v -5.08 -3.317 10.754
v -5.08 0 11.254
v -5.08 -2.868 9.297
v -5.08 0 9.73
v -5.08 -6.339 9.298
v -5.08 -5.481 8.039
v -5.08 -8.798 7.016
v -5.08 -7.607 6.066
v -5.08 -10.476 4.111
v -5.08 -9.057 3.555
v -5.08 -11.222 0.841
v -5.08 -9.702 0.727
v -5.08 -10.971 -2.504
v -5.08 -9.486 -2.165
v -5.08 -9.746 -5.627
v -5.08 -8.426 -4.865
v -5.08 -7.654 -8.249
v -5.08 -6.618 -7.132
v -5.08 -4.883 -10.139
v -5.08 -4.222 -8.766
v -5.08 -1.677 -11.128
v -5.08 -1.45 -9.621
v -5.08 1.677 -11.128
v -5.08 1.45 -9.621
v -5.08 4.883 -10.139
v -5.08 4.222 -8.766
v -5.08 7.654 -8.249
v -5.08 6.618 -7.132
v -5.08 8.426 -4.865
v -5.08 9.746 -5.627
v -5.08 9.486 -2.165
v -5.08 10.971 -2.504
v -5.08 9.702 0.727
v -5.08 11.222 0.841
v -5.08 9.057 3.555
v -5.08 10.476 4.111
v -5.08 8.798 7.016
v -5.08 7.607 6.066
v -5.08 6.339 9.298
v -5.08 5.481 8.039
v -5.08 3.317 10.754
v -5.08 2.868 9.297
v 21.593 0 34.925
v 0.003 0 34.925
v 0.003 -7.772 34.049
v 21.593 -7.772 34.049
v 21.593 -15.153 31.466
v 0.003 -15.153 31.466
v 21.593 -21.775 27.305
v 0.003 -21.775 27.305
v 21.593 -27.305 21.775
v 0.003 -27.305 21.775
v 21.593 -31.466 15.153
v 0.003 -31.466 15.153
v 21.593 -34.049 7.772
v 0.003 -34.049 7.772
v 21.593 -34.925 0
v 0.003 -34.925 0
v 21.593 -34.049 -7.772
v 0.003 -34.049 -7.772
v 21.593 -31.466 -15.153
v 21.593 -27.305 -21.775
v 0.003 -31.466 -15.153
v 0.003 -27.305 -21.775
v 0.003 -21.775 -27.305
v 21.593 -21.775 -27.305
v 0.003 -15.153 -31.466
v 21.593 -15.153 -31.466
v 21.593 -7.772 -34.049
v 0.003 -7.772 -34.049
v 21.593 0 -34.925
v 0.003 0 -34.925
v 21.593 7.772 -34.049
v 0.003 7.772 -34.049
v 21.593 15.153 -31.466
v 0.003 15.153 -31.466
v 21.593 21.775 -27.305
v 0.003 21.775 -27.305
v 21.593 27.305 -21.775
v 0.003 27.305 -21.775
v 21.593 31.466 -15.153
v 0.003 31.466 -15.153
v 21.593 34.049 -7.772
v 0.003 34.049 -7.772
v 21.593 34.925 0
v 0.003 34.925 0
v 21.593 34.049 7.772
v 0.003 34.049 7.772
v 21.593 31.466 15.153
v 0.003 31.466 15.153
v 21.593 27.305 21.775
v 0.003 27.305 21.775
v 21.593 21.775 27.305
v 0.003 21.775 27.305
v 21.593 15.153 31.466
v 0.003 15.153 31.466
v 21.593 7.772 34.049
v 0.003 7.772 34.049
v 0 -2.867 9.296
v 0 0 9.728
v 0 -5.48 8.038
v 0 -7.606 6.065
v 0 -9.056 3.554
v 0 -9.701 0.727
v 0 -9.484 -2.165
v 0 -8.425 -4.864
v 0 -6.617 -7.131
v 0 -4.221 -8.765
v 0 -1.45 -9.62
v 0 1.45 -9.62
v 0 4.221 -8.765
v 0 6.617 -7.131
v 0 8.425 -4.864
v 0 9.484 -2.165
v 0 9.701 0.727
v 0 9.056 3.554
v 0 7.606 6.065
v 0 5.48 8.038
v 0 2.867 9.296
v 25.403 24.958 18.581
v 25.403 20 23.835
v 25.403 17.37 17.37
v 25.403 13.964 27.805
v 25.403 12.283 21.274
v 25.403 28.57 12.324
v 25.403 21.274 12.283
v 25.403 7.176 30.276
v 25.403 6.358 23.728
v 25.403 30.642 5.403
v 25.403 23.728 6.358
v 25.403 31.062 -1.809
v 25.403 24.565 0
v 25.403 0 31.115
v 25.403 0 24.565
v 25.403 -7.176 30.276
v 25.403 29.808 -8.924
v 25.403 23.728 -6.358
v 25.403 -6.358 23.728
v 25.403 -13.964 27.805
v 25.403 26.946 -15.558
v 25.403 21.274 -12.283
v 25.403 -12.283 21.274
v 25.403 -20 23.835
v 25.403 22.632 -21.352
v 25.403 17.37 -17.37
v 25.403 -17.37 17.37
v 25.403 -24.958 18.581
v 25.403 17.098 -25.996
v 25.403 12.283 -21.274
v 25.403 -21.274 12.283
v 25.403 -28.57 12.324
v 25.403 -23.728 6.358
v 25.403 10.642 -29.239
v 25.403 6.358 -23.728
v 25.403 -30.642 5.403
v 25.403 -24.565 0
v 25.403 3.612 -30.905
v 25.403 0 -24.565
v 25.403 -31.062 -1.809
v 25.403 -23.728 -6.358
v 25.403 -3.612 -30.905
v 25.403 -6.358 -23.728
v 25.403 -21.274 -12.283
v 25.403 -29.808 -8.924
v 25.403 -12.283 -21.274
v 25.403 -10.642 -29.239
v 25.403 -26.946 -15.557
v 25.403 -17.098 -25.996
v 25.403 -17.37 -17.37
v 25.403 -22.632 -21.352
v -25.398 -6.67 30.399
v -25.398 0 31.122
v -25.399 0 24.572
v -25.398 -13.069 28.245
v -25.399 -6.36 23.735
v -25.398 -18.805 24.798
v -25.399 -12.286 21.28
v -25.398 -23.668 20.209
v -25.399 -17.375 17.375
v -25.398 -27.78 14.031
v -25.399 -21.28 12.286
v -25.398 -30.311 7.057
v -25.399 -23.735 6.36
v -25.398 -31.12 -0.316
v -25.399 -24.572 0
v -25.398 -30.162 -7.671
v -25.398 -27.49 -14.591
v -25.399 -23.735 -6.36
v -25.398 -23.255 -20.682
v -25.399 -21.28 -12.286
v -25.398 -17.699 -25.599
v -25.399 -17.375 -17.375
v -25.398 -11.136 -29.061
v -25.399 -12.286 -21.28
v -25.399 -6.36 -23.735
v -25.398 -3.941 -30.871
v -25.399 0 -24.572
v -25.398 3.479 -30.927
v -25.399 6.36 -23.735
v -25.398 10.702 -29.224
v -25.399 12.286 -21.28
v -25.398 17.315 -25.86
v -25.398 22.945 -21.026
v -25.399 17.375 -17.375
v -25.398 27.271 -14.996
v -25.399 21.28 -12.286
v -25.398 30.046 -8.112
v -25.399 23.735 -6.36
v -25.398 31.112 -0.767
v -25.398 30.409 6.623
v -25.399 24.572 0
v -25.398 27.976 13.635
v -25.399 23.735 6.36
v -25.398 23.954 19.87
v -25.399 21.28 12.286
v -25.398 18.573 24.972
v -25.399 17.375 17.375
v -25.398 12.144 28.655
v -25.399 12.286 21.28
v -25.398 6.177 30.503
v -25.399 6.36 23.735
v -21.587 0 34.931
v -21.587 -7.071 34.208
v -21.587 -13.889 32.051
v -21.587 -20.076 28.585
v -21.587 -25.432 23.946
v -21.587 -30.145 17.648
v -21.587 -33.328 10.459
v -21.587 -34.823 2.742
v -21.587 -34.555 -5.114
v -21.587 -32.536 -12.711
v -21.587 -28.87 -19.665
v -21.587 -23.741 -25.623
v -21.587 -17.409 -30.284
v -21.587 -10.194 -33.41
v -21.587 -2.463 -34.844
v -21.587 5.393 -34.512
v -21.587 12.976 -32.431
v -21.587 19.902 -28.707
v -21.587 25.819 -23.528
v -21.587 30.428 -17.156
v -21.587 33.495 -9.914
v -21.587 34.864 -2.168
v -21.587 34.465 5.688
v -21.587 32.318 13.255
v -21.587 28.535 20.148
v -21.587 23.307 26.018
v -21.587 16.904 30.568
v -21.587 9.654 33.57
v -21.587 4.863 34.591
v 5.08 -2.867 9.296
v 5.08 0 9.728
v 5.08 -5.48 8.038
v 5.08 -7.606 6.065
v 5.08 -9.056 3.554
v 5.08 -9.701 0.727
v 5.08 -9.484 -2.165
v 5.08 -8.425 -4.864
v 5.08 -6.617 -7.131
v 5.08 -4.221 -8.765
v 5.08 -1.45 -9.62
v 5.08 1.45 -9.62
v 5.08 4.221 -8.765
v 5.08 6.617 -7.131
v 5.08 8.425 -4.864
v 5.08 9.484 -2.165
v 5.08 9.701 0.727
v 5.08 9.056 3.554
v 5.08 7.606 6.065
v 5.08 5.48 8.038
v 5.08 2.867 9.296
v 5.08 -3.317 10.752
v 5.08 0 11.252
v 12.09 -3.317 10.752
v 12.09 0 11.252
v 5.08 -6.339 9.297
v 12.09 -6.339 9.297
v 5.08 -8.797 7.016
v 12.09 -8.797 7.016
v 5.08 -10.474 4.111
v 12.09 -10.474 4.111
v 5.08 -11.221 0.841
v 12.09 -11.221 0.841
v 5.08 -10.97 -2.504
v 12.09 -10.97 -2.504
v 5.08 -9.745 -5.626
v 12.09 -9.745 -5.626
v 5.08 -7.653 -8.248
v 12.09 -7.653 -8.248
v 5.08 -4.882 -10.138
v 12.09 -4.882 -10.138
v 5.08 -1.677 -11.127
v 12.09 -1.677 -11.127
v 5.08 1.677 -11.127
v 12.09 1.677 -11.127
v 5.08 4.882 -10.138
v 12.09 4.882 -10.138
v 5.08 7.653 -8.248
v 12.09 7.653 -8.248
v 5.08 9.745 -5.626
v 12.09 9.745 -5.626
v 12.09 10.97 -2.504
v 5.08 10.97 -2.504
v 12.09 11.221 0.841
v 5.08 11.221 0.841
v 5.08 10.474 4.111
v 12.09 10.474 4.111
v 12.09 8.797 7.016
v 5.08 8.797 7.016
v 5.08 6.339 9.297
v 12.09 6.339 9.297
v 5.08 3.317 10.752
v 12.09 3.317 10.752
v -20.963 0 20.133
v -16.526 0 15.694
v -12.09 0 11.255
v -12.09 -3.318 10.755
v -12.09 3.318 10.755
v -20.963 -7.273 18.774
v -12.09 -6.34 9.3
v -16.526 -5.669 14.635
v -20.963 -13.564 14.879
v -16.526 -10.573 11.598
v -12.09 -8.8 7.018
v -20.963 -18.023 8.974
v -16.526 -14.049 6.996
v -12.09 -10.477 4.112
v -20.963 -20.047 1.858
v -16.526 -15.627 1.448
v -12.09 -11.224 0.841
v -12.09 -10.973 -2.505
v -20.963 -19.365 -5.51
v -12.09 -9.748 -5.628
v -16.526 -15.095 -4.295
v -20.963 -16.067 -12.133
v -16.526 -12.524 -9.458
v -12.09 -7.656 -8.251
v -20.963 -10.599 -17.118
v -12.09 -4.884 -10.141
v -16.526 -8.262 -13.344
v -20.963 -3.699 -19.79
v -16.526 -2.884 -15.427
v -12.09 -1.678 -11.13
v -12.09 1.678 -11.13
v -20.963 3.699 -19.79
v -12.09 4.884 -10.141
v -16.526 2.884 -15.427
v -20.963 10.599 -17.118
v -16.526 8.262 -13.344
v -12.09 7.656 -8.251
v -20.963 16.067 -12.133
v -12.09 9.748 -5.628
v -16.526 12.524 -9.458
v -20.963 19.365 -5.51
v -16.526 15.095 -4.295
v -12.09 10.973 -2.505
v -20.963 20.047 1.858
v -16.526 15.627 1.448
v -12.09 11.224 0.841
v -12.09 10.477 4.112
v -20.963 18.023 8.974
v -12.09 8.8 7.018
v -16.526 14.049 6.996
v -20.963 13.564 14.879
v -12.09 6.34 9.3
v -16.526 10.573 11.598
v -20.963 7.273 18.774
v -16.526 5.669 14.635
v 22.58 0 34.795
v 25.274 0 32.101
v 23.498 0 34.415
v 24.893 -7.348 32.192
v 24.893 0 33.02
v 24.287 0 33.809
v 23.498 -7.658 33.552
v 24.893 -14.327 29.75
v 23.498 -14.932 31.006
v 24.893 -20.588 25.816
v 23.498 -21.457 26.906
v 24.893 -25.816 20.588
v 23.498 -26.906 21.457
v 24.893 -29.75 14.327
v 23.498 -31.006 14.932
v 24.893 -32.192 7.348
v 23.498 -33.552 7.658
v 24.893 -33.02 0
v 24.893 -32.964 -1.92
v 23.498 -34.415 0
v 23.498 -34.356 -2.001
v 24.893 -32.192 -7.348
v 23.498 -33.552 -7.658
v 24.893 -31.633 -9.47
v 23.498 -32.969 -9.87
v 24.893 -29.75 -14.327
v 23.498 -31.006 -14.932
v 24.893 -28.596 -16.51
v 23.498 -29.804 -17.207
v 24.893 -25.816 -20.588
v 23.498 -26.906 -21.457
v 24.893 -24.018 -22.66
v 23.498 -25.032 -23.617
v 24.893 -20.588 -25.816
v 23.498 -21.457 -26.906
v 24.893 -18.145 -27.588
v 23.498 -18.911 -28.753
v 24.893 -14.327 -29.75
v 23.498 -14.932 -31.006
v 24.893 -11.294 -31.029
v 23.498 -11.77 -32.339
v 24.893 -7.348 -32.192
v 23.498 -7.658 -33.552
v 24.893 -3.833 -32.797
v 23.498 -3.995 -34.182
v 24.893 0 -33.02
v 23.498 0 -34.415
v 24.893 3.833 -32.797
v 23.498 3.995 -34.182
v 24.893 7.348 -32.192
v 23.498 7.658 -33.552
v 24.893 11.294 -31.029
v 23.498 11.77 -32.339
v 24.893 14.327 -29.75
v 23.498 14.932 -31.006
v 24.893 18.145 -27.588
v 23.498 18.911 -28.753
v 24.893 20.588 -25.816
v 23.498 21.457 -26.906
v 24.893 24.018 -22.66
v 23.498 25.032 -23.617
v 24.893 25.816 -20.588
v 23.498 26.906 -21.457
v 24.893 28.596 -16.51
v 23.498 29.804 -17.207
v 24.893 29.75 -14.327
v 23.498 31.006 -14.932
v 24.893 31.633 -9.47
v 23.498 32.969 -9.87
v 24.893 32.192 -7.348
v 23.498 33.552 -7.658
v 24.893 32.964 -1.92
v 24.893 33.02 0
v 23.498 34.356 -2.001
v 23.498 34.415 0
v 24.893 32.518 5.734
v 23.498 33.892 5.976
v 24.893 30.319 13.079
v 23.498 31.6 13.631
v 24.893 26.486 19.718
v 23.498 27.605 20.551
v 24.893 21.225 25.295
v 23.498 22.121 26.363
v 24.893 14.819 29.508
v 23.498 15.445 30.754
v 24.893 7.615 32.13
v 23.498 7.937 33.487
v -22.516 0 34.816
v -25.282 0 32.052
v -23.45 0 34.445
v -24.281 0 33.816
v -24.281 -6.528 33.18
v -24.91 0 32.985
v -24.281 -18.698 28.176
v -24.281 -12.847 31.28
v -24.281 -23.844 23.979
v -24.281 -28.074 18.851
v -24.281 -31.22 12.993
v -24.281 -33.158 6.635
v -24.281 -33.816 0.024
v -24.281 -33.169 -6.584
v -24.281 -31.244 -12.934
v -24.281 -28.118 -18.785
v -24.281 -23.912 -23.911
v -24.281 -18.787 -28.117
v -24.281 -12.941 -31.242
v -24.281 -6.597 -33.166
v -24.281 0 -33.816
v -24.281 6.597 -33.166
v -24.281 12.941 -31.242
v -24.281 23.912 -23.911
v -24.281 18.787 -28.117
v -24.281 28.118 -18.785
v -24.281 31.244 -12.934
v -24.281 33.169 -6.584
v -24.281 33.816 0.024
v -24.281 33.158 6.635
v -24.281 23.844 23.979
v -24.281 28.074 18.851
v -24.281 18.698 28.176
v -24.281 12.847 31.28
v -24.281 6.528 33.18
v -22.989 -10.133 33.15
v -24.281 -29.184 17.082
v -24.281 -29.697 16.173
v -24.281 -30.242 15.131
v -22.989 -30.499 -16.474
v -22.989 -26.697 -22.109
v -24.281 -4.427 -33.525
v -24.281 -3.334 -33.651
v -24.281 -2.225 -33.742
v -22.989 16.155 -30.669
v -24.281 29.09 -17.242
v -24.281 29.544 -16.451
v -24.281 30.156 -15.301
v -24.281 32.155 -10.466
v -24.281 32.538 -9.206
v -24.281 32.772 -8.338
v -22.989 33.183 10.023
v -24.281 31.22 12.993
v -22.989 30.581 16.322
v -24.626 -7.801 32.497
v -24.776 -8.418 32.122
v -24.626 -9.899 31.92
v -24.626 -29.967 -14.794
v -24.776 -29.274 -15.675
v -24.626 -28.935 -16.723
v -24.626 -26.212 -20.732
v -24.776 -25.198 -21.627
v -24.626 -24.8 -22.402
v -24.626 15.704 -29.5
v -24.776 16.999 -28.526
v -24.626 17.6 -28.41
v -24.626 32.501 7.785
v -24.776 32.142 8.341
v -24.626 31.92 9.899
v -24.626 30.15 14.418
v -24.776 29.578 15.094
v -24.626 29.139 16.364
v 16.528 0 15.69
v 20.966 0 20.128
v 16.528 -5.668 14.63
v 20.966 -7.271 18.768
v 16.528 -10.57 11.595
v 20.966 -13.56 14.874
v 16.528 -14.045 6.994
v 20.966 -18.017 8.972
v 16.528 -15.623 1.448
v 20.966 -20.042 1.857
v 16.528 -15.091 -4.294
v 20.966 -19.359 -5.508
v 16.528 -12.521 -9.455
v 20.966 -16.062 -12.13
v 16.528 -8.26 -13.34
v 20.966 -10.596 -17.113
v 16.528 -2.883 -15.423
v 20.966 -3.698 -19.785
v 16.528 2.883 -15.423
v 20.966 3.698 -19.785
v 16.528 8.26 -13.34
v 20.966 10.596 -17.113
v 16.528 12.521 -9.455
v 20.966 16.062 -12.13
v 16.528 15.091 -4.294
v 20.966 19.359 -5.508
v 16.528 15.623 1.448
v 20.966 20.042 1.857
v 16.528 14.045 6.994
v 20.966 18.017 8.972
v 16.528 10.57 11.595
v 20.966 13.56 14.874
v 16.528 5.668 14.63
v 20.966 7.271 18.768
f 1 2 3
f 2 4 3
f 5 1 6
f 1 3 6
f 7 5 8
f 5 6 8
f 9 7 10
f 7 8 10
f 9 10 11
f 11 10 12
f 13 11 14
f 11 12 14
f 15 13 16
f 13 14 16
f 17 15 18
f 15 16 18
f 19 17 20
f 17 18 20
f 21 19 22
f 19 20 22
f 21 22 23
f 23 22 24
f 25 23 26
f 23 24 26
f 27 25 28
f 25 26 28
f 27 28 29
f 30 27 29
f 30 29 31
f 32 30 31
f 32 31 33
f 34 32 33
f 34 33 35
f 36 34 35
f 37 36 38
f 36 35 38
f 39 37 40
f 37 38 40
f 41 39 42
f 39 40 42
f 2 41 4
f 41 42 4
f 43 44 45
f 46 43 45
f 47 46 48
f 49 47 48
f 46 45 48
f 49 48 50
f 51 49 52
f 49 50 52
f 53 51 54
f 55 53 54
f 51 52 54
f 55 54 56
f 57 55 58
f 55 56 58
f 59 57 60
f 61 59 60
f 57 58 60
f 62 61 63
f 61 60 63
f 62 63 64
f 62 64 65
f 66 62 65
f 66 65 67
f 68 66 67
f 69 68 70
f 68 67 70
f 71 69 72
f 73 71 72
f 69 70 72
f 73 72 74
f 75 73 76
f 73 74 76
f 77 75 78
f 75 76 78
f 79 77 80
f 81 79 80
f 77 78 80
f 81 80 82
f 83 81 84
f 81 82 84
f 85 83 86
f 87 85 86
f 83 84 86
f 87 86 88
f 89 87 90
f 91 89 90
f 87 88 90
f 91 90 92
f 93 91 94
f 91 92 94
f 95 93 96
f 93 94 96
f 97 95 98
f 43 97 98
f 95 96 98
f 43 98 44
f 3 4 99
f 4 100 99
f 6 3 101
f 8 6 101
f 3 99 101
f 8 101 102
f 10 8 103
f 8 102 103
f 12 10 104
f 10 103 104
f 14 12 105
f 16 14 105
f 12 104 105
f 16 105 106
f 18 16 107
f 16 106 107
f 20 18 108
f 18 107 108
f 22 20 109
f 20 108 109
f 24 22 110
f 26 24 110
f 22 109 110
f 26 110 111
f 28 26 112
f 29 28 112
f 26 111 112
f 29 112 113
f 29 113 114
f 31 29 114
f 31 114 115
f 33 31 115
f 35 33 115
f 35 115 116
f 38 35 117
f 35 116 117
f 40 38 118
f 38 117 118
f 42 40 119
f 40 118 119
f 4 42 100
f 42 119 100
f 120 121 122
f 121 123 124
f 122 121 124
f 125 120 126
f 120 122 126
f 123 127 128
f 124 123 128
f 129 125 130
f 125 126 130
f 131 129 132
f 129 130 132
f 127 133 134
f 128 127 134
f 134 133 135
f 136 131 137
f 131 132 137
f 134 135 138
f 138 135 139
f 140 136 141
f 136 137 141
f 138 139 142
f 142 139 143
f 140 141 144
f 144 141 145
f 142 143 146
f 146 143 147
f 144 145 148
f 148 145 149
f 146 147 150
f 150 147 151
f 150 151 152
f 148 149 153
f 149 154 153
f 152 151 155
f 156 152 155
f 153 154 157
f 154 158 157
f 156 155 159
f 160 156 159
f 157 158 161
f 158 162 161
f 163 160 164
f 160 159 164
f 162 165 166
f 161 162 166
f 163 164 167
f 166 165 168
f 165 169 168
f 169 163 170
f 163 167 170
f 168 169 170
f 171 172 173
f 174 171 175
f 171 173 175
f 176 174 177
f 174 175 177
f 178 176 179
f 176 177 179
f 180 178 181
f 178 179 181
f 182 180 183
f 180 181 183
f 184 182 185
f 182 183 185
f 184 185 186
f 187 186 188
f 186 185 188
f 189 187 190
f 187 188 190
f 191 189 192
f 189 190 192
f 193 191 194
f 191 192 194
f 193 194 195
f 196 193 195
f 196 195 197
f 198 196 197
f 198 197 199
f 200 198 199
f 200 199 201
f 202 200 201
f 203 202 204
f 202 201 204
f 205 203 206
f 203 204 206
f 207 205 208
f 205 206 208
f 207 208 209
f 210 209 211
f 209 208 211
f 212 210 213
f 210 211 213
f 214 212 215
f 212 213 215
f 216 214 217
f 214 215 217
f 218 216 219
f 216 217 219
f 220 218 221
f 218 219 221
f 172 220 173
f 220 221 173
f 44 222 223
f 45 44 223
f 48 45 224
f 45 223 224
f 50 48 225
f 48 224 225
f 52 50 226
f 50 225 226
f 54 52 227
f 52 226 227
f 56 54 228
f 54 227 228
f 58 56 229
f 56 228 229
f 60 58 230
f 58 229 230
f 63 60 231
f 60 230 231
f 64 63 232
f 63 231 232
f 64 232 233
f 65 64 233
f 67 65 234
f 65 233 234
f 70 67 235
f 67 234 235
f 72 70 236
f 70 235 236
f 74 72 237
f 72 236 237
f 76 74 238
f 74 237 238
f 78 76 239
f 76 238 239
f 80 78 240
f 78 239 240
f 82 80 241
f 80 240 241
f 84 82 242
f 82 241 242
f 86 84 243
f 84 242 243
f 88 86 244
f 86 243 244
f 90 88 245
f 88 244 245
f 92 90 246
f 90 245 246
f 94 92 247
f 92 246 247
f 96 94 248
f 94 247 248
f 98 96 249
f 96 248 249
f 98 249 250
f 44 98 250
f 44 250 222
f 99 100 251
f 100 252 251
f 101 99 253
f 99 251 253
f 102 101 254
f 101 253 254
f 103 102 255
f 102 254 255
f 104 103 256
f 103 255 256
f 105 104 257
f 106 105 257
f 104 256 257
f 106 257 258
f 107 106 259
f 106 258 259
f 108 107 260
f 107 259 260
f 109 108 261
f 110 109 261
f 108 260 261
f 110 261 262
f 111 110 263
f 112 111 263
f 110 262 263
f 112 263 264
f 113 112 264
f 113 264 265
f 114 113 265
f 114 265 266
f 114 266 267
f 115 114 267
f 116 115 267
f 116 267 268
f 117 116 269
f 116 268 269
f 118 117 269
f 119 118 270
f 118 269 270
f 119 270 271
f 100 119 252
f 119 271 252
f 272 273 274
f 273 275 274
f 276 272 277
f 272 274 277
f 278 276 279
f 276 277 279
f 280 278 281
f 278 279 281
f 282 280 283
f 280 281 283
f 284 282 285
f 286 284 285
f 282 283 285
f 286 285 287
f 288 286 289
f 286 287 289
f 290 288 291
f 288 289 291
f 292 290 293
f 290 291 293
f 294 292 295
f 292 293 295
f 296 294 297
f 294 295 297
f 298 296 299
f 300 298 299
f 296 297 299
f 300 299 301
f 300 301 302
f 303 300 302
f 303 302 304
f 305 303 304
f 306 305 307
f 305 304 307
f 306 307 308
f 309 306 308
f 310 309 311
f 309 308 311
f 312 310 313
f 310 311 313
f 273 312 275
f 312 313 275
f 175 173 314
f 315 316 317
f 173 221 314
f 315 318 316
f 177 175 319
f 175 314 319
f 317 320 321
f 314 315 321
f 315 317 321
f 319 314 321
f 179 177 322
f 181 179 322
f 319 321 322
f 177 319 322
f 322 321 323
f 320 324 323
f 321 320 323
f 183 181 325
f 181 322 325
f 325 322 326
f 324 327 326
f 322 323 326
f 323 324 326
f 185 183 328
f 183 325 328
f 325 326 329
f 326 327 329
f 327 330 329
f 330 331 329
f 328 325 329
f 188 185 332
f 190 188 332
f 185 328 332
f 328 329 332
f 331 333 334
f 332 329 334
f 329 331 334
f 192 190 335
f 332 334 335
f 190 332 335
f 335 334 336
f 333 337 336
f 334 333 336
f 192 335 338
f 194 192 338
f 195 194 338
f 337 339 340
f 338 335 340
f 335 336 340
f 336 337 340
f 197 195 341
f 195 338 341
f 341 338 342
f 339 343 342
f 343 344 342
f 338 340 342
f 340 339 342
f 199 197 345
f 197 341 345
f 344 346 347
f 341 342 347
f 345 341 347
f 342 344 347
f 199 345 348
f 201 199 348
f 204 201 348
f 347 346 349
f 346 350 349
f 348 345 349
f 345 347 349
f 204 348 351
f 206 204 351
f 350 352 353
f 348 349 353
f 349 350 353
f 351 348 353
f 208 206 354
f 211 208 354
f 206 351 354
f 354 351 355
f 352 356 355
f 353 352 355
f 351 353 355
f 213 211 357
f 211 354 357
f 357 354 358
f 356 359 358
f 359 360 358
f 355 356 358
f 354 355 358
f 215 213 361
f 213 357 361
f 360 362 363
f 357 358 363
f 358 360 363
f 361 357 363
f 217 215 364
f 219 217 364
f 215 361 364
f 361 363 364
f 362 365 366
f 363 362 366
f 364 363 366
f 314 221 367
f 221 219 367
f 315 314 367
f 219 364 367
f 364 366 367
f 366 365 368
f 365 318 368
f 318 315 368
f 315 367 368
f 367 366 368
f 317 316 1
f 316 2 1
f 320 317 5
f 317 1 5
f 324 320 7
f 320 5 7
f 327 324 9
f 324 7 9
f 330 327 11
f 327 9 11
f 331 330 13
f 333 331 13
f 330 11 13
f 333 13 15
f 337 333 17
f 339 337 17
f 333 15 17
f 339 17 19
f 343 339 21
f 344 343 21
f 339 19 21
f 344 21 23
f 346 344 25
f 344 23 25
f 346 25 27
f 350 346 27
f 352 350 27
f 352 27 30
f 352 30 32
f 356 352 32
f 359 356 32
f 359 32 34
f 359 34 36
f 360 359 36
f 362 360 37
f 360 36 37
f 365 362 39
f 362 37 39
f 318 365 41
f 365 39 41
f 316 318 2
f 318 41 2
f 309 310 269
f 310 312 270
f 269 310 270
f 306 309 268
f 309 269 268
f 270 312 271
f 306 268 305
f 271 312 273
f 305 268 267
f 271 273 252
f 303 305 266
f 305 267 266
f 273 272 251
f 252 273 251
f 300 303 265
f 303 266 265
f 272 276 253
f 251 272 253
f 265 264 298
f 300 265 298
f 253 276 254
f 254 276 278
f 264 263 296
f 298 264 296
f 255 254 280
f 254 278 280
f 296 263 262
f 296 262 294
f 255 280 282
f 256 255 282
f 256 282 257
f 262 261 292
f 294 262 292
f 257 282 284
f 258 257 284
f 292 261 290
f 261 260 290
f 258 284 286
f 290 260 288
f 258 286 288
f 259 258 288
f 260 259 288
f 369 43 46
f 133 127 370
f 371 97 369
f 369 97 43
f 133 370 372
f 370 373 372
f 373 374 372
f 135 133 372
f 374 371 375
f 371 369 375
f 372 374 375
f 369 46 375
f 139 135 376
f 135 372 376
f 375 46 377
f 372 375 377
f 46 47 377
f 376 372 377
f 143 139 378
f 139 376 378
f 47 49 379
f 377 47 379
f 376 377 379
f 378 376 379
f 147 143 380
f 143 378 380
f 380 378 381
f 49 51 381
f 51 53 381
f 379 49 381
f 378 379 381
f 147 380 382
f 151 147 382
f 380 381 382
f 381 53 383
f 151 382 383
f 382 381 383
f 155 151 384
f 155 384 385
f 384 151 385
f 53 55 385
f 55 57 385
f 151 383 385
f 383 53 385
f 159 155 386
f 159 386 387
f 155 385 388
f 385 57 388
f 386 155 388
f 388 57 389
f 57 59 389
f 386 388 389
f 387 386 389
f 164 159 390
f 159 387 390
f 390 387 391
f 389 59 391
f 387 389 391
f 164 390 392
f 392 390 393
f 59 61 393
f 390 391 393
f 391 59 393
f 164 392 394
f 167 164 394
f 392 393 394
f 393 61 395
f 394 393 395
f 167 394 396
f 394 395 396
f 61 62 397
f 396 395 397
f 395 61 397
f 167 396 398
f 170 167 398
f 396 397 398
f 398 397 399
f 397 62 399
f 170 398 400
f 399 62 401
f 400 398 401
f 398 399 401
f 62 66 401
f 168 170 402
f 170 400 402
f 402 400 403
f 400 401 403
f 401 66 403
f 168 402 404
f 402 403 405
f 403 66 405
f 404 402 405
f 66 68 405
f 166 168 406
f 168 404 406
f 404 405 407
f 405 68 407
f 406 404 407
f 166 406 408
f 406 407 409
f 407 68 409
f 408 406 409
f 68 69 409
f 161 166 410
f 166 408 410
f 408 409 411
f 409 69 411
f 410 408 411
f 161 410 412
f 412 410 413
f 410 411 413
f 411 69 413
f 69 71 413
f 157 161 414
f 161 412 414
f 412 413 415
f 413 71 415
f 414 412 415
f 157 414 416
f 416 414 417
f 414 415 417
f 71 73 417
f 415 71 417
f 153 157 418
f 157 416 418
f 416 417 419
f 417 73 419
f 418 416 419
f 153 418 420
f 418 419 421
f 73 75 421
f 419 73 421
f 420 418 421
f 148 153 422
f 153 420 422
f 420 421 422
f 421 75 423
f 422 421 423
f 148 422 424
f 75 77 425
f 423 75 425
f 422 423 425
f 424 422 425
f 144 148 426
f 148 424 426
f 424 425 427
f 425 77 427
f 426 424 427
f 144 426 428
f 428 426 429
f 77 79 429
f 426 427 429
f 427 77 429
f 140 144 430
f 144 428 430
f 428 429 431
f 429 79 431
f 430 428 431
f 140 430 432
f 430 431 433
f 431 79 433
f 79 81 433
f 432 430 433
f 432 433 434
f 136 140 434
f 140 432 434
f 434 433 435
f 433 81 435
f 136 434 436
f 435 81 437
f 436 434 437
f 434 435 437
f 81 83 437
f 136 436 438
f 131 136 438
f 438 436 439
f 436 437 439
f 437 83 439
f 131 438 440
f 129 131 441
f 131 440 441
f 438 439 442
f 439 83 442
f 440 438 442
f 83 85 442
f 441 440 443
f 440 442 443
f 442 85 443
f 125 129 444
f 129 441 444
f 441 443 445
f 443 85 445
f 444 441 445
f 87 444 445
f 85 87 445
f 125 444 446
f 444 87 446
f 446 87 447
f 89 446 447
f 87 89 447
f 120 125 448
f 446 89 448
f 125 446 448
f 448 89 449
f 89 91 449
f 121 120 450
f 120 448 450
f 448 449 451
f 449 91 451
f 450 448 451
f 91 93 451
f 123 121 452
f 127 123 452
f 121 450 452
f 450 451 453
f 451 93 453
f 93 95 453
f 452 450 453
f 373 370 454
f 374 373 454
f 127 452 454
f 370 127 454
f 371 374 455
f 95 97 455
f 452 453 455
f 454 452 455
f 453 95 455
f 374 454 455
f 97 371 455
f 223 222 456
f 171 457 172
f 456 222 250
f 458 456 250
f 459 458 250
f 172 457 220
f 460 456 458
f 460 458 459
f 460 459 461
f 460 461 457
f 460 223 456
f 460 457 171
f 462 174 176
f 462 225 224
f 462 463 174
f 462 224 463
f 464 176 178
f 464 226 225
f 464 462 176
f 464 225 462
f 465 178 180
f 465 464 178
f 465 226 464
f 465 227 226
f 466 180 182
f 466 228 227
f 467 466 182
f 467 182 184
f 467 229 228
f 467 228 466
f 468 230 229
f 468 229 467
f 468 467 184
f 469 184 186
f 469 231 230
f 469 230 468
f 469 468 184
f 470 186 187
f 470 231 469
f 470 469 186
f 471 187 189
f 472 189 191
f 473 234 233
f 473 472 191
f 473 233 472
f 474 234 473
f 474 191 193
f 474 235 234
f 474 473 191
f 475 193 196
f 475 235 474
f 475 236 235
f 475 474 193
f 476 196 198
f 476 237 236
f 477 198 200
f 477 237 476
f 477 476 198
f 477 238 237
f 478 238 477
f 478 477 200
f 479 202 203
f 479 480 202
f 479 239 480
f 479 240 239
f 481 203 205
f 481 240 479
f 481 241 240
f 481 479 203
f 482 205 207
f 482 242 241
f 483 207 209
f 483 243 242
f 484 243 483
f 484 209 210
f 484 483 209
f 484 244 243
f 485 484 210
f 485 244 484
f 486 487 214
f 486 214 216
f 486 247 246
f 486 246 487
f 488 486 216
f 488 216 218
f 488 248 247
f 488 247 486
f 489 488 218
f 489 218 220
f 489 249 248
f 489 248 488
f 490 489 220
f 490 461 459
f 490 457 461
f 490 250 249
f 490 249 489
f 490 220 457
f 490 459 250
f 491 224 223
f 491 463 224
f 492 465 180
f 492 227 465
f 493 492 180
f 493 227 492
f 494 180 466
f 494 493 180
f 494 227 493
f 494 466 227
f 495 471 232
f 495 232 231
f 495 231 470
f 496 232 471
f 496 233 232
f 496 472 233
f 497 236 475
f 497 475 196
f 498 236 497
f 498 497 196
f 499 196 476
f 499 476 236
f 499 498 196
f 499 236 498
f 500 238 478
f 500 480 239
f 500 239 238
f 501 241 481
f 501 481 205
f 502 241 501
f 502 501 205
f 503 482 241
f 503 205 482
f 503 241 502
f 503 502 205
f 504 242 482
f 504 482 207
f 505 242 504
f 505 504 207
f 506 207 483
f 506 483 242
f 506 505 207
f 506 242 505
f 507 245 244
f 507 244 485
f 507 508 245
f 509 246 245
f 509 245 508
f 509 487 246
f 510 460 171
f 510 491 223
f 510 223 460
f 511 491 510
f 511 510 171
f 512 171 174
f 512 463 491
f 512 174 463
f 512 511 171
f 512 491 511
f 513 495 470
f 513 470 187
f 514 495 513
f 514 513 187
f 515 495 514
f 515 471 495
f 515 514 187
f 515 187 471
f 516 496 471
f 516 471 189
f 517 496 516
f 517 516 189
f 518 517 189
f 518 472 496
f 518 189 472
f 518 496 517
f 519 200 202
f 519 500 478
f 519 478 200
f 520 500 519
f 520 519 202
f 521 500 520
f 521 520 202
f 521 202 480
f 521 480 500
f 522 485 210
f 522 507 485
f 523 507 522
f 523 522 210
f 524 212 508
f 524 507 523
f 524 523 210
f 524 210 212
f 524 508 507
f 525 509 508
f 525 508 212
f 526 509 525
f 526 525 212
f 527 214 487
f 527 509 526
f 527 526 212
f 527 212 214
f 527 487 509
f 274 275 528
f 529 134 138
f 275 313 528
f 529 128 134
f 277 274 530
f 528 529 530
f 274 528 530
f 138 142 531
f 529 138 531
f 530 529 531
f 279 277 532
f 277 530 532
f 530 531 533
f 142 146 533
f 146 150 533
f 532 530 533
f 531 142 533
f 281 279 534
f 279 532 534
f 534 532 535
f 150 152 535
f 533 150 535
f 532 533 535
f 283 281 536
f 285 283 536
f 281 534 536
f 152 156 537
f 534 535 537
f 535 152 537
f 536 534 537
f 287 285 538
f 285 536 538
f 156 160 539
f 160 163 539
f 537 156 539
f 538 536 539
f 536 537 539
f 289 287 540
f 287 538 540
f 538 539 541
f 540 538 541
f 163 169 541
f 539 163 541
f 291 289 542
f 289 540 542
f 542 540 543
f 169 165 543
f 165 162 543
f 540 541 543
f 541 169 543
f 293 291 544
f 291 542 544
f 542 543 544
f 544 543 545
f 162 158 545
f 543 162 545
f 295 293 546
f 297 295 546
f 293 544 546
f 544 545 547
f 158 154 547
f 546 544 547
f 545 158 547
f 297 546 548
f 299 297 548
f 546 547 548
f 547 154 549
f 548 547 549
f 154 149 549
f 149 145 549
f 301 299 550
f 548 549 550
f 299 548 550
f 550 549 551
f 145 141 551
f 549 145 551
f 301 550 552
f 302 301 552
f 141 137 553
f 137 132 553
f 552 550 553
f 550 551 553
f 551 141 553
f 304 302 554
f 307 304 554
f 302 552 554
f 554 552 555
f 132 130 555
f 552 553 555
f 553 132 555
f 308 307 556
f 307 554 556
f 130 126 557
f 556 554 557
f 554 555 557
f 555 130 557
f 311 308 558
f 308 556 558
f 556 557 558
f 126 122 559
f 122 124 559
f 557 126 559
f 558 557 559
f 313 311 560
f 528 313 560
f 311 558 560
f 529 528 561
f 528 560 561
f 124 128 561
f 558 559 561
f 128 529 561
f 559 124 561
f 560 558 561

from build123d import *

# Parameters (mm, degrees)
F2_R = 3.81


with BuildPart() as f1:
    # F0 (on Front) → F1 (revolve)
    with BuildSketch(Plane.XZ):
        Polygon((0, 9.7282), (0.003413, 34.925), (-25.396586, 34.93188), (-25.399393, 24.572093), (-12.089987, 11.255475), (-5.079587, 11.253576), (-5.08, 9.729576), align=None)
        Polygon((25.403413, 34.925), (0.003413, 34.925), (0, 9.7282), (5.08, 9.7282), (5.08, 11.2522), (12.0904, 11.2522), (25.403413, 24.565213), align=None)
    revolve(axis=Axis((5.383427, 0, 0), (1, 0, 0)))

    # F2
    f2_edges = [f1.edges().sort_by_distance(p)[0] for p in [
        (25.403413, 0, -34.925),
        (-25.396586, 0, -34.93188),
    ]]
    fillet(f2_edges, radius=F2_R)


solid = f1.part
